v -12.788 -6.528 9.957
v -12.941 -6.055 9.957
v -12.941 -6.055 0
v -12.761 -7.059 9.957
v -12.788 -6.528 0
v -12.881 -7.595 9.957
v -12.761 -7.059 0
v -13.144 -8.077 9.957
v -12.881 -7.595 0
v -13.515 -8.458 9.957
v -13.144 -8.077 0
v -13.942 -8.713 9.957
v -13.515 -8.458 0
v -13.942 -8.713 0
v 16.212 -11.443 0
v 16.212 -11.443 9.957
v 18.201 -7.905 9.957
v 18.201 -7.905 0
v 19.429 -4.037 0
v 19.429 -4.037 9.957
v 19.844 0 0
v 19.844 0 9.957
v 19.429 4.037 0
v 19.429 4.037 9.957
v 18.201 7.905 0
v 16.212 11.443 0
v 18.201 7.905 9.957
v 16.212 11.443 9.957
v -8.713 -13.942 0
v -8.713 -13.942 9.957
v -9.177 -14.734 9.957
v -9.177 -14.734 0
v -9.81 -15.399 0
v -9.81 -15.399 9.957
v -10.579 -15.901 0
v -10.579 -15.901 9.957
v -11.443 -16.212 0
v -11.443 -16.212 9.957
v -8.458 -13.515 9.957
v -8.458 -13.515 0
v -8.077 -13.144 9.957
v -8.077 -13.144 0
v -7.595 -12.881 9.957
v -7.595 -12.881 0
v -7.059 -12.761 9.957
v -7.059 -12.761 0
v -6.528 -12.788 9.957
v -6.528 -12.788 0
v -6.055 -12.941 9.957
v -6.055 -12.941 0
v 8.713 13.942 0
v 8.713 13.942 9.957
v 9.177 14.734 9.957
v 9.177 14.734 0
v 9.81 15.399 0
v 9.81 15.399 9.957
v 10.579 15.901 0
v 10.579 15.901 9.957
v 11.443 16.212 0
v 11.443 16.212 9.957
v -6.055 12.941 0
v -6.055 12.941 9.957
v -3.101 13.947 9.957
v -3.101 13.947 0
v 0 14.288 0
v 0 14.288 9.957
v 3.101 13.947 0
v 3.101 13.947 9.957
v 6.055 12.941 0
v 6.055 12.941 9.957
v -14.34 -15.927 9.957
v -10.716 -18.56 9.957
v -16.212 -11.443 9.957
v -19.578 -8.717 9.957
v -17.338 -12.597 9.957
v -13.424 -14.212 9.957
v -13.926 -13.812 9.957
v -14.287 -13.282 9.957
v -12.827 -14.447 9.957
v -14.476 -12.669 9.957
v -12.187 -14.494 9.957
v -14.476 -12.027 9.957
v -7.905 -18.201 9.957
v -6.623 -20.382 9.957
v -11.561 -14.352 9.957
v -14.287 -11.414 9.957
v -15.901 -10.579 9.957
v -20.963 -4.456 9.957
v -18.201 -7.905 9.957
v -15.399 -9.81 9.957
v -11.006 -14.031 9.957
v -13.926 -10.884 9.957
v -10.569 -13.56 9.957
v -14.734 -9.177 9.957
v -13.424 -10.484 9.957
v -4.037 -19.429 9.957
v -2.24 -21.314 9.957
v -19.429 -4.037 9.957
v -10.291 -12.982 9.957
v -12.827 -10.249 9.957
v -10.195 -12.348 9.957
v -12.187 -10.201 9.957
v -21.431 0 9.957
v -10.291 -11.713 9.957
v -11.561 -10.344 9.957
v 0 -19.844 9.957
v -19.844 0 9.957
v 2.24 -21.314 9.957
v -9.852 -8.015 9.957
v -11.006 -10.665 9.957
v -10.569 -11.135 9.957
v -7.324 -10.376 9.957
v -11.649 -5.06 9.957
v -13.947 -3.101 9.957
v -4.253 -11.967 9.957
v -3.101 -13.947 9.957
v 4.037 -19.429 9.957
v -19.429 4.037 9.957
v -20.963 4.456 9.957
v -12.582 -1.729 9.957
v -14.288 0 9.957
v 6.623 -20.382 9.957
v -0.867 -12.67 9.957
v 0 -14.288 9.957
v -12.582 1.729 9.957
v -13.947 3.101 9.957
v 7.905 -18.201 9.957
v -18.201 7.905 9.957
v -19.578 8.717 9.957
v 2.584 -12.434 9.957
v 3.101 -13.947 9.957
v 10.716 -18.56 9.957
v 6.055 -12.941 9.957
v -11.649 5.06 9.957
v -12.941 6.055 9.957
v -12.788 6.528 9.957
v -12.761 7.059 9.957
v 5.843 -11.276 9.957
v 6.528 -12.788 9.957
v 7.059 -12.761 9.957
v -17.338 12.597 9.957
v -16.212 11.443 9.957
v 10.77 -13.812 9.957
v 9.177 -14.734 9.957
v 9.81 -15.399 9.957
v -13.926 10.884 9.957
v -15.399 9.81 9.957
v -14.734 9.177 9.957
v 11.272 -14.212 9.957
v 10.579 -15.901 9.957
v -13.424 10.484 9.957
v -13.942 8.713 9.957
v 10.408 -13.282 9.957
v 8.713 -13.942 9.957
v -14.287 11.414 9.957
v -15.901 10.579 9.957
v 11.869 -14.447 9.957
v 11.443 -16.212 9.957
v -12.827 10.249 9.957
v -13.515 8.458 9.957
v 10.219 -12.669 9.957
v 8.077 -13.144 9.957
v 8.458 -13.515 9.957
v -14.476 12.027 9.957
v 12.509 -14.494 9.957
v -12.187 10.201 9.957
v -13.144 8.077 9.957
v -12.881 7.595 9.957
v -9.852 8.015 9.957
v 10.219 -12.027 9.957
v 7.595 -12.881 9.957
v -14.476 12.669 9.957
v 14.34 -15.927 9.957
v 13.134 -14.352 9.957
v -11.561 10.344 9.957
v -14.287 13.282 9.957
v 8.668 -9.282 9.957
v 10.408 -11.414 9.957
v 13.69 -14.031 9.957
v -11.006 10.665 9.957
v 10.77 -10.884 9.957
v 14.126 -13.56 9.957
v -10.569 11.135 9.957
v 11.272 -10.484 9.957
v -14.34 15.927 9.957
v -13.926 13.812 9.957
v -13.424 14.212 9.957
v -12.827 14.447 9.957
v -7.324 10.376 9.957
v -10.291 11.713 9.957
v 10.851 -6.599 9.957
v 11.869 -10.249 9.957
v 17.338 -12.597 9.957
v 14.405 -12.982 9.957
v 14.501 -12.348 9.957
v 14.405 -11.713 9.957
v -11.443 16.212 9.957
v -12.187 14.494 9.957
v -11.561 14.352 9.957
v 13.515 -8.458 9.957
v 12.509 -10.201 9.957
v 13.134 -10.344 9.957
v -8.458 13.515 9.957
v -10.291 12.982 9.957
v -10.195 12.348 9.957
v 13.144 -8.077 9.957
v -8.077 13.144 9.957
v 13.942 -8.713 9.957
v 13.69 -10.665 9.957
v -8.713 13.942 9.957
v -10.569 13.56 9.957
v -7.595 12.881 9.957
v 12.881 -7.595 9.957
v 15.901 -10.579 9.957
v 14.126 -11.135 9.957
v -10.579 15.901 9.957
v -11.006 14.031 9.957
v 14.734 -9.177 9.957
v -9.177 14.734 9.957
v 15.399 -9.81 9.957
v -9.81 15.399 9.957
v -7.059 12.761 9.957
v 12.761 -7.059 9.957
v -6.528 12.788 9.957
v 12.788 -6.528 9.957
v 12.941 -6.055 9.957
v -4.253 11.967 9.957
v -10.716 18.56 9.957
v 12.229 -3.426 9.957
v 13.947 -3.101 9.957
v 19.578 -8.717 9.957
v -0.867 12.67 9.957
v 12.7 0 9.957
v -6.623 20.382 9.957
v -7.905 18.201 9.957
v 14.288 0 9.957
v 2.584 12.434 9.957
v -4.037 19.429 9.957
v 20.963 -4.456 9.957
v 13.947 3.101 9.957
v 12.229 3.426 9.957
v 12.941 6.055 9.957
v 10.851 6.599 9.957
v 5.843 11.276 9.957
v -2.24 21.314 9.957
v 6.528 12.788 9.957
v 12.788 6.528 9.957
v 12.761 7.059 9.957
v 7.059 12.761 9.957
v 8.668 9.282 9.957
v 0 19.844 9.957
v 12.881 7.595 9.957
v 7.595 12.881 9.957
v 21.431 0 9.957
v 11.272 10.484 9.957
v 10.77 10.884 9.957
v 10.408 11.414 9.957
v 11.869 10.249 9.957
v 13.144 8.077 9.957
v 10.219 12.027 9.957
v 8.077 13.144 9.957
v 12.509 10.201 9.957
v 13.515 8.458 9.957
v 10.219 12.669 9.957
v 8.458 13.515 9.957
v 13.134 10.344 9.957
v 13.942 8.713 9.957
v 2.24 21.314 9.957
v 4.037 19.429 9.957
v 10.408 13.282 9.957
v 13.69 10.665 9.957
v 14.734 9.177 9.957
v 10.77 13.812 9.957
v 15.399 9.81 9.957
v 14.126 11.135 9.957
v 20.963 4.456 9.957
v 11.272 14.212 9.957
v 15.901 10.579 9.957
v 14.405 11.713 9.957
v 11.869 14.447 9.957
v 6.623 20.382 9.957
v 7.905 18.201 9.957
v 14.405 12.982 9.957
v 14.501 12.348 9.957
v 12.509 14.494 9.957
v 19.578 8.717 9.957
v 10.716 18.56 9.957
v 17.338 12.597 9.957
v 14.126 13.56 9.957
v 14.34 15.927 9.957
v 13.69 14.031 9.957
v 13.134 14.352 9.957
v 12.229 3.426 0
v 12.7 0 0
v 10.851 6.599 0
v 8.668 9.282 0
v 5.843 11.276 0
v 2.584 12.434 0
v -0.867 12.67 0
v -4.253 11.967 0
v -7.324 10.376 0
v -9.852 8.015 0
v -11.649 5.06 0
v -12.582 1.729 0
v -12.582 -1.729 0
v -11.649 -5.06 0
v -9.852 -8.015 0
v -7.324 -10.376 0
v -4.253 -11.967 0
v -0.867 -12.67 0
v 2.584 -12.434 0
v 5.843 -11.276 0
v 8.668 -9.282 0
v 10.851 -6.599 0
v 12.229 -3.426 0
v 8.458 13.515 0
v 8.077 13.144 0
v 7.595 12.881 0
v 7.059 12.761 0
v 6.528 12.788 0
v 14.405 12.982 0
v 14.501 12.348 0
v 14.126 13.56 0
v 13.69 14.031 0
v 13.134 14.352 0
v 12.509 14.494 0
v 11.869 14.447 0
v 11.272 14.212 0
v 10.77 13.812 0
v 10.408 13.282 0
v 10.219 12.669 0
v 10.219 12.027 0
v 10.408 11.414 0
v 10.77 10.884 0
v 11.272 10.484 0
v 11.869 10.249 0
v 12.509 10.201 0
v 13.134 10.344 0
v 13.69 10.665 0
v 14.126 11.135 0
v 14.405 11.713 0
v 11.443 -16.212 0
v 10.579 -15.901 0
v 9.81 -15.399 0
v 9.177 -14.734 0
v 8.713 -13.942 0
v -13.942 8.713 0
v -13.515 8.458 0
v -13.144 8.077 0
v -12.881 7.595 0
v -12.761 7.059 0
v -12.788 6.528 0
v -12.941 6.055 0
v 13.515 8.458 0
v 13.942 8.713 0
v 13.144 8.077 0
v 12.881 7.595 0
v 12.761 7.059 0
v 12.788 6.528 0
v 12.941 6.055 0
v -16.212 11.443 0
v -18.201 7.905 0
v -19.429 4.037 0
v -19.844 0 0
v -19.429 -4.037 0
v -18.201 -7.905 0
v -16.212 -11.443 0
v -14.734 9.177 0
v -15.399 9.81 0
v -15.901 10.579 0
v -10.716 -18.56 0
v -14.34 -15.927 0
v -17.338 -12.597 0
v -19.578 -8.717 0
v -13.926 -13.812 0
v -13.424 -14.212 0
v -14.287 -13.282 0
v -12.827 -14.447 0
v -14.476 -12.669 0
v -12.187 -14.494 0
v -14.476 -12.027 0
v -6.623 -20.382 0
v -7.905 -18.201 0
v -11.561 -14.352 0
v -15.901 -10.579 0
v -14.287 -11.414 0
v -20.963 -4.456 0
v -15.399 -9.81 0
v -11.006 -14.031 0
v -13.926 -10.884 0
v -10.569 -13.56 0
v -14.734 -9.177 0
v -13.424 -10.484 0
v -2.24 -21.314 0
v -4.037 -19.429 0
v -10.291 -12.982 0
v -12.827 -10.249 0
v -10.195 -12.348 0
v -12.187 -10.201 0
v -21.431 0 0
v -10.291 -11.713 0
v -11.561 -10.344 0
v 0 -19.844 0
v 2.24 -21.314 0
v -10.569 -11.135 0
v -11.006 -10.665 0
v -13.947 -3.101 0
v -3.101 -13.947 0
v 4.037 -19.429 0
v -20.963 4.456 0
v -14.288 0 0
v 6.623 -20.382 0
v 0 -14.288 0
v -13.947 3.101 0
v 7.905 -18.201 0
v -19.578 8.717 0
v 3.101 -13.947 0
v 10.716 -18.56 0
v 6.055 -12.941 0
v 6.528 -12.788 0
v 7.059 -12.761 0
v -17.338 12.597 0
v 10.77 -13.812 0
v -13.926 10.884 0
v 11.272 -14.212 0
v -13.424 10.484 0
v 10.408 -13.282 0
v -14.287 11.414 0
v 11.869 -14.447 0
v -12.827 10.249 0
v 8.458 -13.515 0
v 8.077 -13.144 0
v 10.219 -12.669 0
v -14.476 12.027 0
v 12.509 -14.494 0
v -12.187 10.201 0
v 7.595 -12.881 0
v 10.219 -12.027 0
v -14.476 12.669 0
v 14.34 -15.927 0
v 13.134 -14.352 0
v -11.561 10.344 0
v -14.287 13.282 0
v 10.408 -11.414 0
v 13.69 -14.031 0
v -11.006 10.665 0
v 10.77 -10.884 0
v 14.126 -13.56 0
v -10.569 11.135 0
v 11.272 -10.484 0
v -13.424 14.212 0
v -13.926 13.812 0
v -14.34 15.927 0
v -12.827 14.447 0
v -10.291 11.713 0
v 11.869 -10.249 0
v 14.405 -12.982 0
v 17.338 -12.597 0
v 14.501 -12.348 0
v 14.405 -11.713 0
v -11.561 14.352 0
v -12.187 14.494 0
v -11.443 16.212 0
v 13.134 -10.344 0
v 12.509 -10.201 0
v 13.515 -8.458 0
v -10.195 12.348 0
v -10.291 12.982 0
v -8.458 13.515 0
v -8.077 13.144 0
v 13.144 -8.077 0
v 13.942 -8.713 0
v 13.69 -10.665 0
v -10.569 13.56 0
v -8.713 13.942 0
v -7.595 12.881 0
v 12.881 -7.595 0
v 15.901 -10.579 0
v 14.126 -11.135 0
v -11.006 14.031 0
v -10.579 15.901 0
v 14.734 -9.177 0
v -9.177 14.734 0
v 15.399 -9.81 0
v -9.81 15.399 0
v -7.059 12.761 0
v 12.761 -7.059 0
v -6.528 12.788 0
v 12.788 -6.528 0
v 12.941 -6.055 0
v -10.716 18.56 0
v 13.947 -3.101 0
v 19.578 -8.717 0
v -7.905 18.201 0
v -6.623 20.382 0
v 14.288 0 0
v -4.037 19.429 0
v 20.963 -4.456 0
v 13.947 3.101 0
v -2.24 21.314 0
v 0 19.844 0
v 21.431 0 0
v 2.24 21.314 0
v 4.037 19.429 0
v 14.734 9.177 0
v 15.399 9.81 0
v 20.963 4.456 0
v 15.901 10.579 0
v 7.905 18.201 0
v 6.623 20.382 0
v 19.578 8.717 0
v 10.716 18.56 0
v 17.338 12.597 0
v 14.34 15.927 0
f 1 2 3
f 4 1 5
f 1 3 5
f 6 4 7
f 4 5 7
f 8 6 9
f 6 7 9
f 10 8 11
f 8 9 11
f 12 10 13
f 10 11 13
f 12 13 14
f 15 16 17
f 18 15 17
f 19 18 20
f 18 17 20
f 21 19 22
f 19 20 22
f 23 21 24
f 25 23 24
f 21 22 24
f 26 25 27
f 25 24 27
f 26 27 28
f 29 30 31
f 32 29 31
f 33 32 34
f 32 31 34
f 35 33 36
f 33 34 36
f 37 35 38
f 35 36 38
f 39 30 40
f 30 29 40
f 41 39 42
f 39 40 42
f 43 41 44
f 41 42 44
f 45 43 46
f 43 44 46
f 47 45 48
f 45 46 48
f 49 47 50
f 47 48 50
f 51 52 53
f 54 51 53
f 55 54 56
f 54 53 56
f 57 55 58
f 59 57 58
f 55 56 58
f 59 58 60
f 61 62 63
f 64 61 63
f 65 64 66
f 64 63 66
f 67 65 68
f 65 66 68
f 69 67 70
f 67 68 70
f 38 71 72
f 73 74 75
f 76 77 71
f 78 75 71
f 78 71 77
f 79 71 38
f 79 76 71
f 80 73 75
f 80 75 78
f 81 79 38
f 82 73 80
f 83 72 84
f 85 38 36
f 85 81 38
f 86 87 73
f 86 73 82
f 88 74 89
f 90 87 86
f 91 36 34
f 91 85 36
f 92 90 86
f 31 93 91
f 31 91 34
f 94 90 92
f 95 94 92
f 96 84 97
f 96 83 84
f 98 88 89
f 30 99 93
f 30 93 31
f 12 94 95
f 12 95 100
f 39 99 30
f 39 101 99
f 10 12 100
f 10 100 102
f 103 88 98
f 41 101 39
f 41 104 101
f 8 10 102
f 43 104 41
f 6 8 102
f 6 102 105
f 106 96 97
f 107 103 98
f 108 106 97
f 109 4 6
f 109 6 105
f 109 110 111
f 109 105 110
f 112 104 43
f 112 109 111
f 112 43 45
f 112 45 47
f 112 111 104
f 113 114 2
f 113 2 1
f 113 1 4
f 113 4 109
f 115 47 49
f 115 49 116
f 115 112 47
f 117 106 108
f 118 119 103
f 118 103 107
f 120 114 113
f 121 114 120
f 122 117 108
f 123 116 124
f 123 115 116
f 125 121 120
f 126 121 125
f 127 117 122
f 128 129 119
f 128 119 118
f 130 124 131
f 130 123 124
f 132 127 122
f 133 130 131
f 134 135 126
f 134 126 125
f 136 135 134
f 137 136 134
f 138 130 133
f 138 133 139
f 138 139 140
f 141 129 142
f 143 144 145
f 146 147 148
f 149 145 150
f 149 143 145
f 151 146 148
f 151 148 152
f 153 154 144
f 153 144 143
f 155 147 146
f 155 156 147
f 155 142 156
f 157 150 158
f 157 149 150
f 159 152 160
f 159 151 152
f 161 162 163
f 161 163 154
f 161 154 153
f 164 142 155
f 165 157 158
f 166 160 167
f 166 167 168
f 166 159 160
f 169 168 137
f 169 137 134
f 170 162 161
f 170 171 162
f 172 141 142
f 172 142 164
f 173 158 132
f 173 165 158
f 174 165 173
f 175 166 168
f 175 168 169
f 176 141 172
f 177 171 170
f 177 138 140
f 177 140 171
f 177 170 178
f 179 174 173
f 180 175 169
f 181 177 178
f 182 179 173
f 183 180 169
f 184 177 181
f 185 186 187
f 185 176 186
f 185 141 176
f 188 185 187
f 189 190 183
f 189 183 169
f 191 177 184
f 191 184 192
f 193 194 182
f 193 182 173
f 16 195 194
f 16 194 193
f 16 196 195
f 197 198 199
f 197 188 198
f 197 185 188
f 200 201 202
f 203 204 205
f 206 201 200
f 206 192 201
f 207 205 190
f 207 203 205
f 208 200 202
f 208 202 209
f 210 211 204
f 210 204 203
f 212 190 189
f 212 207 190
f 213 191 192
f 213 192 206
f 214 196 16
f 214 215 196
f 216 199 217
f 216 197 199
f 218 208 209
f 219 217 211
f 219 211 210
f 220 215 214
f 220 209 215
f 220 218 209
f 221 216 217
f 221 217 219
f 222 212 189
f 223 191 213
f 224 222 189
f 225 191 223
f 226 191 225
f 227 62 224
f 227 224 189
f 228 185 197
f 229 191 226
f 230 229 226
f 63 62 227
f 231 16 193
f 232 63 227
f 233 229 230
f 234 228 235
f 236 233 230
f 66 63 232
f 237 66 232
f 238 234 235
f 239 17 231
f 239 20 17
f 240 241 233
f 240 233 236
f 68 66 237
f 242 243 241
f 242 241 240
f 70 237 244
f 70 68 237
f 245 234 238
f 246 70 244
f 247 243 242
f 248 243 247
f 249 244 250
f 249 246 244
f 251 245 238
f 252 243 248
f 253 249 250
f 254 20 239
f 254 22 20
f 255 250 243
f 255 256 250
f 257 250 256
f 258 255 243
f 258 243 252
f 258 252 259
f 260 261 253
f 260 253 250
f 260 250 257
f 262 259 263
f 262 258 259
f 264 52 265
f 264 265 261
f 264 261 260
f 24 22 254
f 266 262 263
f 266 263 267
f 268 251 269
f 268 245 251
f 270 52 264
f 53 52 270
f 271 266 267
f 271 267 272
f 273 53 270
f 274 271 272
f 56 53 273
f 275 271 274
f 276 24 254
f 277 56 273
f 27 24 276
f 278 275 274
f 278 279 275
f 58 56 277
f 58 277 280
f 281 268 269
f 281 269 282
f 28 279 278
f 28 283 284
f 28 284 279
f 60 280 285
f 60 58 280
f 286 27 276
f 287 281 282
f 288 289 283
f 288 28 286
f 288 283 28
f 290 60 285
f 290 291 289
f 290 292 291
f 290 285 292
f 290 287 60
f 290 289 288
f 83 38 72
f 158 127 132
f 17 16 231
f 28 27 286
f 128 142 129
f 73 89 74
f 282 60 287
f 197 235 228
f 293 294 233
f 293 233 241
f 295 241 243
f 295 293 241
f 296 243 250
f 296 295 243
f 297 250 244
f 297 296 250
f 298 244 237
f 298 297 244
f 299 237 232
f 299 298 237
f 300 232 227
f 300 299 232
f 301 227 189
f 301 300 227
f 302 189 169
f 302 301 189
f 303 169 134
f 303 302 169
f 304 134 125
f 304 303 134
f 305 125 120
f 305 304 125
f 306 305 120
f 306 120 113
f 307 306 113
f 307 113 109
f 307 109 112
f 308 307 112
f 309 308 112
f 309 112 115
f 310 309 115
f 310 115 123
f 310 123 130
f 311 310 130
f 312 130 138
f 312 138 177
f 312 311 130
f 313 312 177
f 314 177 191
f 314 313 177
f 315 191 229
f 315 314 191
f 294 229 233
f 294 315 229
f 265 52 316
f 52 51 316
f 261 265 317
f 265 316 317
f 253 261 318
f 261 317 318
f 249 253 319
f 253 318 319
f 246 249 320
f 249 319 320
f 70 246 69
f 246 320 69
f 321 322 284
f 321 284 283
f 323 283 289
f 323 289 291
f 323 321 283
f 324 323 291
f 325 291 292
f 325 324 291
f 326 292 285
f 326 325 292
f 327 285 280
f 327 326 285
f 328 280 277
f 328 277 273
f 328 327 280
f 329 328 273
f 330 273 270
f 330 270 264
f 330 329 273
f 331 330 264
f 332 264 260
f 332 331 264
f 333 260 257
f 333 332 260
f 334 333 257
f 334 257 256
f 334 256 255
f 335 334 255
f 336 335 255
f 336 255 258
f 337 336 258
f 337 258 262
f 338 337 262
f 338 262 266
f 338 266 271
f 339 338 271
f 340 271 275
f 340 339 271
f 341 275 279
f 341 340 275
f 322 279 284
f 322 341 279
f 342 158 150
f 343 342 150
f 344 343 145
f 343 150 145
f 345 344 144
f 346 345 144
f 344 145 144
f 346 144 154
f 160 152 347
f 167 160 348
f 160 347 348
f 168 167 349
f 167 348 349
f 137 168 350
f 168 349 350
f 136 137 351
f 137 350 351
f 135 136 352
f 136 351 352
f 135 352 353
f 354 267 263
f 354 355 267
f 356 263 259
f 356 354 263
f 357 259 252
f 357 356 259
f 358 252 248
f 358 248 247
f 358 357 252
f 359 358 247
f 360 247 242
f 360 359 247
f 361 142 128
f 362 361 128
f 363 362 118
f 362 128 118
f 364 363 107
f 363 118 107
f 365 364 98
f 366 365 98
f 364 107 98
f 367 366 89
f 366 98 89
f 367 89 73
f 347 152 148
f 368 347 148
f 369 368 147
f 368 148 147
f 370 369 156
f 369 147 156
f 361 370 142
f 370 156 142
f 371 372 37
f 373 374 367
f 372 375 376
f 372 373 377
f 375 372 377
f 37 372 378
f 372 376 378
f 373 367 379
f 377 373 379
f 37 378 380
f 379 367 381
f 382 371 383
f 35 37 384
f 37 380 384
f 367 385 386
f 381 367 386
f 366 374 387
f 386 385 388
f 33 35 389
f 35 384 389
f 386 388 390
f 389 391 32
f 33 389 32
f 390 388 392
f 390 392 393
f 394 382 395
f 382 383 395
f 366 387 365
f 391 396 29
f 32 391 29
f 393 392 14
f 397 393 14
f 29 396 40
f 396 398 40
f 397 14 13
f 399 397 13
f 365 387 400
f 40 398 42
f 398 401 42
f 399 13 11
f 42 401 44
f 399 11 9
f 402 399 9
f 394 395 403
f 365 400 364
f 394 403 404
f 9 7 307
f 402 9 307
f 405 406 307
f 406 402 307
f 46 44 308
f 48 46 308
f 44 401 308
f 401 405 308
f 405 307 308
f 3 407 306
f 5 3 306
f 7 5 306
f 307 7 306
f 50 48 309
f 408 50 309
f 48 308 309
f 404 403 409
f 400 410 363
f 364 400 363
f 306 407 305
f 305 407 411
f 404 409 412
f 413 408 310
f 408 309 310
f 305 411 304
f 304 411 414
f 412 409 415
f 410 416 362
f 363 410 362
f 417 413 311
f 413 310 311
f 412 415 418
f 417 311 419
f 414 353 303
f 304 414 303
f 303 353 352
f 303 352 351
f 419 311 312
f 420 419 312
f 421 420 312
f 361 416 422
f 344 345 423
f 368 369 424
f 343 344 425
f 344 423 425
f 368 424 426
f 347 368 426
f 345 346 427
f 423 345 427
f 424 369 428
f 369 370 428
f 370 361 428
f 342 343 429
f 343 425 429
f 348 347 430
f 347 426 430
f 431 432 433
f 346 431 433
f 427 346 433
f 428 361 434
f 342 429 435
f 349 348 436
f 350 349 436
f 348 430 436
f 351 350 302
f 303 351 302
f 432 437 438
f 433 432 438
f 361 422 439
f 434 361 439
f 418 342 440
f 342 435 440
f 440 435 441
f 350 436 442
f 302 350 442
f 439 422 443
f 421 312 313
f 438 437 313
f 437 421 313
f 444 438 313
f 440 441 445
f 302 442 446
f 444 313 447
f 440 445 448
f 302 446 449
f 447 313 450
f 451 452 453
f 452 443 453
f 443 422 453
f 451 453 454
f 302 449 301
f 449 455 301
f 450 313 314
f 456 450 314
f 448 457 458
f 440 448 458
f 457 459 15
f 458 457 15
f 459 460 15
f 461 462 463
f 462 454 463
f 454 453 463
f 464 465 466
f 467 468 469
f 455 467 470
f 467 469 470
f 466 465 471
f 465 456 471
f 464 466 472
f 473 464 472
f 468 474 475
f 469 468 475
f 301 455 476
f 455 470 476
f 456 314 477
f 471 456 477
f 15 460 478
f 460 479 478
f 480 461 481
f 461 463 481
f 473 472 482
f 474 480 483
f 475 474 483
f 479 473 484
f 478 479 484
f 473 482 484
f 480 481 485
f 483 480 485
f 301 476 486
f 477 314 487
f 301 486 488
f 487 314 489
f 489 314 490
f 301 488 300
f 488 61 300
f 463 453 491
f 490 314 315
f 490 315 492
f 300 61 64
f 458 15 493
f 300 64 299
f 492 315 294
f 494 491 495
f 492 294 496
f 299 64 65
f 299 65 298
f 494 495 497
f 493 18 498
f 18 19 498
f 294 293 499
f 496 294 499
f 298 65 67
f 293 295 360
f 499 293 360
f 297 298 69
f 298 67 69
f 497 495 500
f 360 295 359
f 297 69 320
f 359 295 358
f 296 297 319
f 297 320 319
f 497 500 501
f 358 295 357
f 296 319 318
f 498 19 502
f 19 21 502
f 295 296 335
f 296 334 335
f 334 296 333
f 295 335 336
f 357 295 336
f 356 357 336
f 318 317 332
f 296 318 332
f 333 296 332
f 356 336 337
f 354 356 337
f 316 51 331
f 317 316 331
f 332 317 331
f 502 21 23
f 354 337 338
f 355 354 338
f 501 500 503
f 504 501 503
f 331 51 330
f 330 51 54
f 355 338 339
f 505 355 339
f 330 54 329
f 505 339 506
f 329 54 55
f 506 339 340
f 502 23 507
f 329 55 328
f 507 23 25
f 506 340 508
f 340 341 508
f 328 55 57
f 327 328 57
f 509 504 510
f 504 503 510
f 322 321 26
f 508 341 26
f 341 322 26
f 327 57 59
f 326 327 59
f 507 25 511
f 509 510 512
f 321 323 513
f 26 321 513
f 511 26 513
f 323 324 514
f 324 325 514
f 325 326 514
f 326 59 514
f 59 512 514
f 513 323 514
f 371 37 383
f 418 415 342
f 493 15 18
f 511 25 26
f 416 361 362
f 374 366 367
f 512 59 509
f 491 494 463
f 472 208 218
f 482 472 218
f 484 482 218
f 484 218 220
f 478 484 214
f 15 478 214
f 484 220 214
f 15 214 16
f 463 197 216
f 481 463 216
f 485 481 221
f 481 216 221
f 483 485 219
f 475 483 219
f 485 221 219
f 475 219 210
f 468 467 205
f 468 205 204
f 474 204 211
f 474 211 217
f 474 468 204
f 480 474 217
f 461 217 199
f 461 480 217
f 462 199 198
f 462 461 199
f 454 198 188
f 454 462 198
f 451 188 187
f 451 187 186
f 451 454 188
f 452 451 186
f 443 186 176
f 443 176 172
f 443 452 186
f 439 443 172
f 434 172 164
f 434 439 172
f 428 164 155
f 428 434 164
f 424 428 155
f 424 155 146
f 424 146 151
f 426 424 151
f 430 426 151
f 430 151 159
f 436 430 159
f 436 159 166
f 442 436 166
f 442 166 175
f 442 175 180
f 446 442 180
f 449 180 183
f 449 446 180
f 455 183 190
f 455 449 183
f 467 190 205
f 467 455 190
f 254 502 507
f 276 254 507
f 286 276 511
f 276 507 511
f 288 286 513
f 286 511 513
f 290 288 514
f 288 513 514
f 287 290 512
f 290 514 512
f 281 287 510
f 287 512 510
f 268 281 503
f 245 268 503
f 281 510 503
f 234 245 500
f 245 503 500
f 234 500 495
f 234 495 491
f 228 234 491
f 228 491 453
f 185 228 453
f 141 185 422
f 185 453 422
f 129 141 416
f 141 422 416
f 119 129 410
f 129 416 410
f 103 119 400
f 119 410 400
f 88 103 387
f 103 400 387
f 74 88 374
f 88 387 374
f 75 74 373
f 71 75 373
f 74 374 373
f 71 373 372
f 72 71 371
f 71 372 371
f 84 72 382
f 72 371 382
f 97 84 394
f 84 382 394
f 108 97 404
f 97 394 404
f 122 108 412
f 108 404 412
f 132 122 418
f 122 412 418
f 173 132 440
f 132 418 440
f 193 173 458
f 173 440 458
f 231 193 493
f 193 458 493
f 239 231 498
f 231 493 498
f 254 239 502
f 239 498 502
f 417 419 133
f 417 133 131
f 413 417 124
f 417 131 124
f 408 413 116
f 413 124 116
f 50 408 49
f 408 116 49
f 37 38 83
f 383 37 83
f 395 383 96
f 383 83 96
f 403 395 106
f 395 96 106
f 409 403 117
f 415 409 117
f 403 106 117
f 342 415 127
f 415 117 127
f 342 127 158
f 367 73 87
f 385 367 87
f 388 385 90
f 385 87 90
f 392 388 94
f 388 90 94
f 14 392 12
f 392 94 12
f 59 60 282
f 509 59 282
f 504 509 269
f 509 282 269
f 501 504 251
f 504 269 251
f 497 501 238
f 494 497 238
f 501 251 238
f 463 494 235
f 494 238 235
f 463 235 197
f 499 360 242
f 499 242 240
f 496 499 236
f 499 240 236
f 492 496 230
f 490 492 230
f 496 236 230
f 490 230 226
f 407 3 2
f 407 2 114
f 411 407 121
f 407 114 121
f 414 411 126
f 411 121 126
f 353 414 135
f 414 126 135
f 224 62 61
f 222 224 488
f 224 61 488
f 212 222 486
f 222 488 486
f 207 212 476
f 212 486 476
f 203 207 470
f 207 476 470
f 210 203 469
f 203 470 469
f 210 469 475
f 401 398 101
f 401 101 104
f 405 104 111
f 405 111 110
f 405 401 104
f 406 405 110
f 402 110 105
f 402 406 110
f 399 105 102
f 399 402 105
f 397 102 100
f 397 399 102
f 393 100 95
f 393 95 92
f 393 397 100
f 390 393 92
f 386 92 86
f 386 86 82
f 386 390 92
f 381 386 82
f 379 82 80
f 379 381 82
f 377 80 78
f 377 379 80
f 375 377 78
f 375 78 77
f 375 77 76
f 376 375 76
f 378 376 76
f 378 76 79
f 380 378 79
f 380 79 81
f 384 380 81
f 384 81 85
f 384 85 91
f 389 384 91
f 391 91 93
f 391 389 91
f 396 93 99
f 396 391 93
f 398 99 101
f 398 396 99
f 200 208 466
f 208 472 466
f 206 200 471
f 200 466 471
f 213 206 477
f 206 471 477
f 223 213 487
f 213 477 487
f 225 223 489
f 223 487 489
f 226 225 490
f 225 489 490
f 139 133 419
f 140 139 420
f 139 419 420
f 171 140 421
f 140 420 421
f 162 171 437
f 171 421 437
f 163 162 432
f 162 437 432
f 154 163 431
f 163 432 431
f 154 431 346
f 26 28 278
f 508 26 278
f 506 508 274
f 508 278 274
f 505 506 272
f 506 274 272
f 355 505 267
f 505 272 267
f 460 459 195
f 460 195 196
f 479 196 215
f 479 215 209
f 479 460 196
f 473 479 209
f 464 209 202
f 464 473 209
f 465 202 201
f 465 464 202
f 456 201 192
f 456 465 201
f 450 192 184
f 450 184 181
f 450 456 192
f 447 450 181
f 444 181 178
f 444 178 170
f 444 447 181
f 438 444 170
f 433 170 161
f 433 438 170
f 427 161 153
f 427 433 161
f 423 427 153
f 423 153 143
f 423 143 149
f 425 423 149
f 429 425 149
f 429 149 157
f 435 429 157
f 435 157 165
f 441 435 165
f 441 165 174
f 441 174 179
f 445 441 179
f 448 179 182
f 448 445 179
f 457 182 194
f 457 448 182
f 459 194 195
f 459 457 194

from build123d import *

# Parameters (mm, degrees)
F0_R            = 21.43125
F0_R_2          = 2.15265
F0_R_3          = 12.7
F1_DEPTH        = 9.9568
F3_DEPTH        = 9.9568
F3_COPIES_COUNT = 4
F4_R            = 1.984375


# Not quite as in the source:
# - a pattern or mirror of a feature is missing from the dataset's text; its kind, count and spacing are read off the source's solid


with BuildPart() as f1:
    # F0 (on Top) → F1 (new body)
    with BuildSketch(Plane.XY):
        Circle(F0_R)
        with Locations((-12.3478521665, -12.3478521665)):
            Circle(F0_R_2, mode=Mode.SUBTRACT)
        with Locations((12.3478521665, -12.3478521665)):
            Circle(F0_R_2, mode=Mode.SUBTRACT)
        with Locations((-12.3478521665, 12.3478521665)):
            Circle(F0_R_2, mode=Mode.SUBTRACT)
        Circle(F0_R_3, mode=Mode.SUBTRACT)
        with Locations((12.3478521665, 12.3478521665)):
            Circle(F0_R_2, mode=Mode.SUBTRACT)
    extrude(amount=F1_DEPTH)

    # F2 (on face) → F3 (cut, through all)
    with BuildSketch(Plane.XY.offset(9.9568)):
        with BuildLine():
            ThreePointArc((8.4692641257, 11.5067033254), (8.9929440308, 14.4681276118), (11.4430257563, 16.212081162))
            ThreePointArc((11.4430257563, 16.212081162), (0, 19.84375), (-11.4430257563, 16.212081162))
            ThreePointArc((-11.4430257563, 16.212081162), (-8.9929440308, 14.4681276118), (-8.4692641257, 11.5067033254))
            ThreePointArc((-8.4692641257, 11.5067033254), (0, 14.2875), (8.4692641257, 11.5067033254))
        make_face()
    f3 = extrude(amount=-F3_DEPTH, mode=Mode.SUBTRACT)

    # F3_copies: F3 ×4 about axis
    f3_copies_axis = Axis((0, 0, 0), (0, 0, 1))
    for i in range(1, F3_COPIES_COUNT):
        add(f3.rotate(f3_copies_axis, i * 360 / F3_COPIES_COUNT), mode=Mode.SUBTRACT)

    # F4
    f4_edges = [f1.edges().sort_by_distance(p)[0] for p in [
        (8.469264, 11.506703, 4.9784),
        (-8.469264, 11.506703, 4.9784),
        (8.469264, -11.506703, 4.9784),
        (-8.469264, -11.506703, 4.9784),
        (11.506703, 8.469264, 4.9784),
        (11.506703, -8.469264, 4.9784),
        (-11.506703, -8.469264, 4.9784),
        (-11.506703, 8.469264, 4.9784),
    ]]
    fillet(f4_edges, radius=F4_R)


solid = f1.part
